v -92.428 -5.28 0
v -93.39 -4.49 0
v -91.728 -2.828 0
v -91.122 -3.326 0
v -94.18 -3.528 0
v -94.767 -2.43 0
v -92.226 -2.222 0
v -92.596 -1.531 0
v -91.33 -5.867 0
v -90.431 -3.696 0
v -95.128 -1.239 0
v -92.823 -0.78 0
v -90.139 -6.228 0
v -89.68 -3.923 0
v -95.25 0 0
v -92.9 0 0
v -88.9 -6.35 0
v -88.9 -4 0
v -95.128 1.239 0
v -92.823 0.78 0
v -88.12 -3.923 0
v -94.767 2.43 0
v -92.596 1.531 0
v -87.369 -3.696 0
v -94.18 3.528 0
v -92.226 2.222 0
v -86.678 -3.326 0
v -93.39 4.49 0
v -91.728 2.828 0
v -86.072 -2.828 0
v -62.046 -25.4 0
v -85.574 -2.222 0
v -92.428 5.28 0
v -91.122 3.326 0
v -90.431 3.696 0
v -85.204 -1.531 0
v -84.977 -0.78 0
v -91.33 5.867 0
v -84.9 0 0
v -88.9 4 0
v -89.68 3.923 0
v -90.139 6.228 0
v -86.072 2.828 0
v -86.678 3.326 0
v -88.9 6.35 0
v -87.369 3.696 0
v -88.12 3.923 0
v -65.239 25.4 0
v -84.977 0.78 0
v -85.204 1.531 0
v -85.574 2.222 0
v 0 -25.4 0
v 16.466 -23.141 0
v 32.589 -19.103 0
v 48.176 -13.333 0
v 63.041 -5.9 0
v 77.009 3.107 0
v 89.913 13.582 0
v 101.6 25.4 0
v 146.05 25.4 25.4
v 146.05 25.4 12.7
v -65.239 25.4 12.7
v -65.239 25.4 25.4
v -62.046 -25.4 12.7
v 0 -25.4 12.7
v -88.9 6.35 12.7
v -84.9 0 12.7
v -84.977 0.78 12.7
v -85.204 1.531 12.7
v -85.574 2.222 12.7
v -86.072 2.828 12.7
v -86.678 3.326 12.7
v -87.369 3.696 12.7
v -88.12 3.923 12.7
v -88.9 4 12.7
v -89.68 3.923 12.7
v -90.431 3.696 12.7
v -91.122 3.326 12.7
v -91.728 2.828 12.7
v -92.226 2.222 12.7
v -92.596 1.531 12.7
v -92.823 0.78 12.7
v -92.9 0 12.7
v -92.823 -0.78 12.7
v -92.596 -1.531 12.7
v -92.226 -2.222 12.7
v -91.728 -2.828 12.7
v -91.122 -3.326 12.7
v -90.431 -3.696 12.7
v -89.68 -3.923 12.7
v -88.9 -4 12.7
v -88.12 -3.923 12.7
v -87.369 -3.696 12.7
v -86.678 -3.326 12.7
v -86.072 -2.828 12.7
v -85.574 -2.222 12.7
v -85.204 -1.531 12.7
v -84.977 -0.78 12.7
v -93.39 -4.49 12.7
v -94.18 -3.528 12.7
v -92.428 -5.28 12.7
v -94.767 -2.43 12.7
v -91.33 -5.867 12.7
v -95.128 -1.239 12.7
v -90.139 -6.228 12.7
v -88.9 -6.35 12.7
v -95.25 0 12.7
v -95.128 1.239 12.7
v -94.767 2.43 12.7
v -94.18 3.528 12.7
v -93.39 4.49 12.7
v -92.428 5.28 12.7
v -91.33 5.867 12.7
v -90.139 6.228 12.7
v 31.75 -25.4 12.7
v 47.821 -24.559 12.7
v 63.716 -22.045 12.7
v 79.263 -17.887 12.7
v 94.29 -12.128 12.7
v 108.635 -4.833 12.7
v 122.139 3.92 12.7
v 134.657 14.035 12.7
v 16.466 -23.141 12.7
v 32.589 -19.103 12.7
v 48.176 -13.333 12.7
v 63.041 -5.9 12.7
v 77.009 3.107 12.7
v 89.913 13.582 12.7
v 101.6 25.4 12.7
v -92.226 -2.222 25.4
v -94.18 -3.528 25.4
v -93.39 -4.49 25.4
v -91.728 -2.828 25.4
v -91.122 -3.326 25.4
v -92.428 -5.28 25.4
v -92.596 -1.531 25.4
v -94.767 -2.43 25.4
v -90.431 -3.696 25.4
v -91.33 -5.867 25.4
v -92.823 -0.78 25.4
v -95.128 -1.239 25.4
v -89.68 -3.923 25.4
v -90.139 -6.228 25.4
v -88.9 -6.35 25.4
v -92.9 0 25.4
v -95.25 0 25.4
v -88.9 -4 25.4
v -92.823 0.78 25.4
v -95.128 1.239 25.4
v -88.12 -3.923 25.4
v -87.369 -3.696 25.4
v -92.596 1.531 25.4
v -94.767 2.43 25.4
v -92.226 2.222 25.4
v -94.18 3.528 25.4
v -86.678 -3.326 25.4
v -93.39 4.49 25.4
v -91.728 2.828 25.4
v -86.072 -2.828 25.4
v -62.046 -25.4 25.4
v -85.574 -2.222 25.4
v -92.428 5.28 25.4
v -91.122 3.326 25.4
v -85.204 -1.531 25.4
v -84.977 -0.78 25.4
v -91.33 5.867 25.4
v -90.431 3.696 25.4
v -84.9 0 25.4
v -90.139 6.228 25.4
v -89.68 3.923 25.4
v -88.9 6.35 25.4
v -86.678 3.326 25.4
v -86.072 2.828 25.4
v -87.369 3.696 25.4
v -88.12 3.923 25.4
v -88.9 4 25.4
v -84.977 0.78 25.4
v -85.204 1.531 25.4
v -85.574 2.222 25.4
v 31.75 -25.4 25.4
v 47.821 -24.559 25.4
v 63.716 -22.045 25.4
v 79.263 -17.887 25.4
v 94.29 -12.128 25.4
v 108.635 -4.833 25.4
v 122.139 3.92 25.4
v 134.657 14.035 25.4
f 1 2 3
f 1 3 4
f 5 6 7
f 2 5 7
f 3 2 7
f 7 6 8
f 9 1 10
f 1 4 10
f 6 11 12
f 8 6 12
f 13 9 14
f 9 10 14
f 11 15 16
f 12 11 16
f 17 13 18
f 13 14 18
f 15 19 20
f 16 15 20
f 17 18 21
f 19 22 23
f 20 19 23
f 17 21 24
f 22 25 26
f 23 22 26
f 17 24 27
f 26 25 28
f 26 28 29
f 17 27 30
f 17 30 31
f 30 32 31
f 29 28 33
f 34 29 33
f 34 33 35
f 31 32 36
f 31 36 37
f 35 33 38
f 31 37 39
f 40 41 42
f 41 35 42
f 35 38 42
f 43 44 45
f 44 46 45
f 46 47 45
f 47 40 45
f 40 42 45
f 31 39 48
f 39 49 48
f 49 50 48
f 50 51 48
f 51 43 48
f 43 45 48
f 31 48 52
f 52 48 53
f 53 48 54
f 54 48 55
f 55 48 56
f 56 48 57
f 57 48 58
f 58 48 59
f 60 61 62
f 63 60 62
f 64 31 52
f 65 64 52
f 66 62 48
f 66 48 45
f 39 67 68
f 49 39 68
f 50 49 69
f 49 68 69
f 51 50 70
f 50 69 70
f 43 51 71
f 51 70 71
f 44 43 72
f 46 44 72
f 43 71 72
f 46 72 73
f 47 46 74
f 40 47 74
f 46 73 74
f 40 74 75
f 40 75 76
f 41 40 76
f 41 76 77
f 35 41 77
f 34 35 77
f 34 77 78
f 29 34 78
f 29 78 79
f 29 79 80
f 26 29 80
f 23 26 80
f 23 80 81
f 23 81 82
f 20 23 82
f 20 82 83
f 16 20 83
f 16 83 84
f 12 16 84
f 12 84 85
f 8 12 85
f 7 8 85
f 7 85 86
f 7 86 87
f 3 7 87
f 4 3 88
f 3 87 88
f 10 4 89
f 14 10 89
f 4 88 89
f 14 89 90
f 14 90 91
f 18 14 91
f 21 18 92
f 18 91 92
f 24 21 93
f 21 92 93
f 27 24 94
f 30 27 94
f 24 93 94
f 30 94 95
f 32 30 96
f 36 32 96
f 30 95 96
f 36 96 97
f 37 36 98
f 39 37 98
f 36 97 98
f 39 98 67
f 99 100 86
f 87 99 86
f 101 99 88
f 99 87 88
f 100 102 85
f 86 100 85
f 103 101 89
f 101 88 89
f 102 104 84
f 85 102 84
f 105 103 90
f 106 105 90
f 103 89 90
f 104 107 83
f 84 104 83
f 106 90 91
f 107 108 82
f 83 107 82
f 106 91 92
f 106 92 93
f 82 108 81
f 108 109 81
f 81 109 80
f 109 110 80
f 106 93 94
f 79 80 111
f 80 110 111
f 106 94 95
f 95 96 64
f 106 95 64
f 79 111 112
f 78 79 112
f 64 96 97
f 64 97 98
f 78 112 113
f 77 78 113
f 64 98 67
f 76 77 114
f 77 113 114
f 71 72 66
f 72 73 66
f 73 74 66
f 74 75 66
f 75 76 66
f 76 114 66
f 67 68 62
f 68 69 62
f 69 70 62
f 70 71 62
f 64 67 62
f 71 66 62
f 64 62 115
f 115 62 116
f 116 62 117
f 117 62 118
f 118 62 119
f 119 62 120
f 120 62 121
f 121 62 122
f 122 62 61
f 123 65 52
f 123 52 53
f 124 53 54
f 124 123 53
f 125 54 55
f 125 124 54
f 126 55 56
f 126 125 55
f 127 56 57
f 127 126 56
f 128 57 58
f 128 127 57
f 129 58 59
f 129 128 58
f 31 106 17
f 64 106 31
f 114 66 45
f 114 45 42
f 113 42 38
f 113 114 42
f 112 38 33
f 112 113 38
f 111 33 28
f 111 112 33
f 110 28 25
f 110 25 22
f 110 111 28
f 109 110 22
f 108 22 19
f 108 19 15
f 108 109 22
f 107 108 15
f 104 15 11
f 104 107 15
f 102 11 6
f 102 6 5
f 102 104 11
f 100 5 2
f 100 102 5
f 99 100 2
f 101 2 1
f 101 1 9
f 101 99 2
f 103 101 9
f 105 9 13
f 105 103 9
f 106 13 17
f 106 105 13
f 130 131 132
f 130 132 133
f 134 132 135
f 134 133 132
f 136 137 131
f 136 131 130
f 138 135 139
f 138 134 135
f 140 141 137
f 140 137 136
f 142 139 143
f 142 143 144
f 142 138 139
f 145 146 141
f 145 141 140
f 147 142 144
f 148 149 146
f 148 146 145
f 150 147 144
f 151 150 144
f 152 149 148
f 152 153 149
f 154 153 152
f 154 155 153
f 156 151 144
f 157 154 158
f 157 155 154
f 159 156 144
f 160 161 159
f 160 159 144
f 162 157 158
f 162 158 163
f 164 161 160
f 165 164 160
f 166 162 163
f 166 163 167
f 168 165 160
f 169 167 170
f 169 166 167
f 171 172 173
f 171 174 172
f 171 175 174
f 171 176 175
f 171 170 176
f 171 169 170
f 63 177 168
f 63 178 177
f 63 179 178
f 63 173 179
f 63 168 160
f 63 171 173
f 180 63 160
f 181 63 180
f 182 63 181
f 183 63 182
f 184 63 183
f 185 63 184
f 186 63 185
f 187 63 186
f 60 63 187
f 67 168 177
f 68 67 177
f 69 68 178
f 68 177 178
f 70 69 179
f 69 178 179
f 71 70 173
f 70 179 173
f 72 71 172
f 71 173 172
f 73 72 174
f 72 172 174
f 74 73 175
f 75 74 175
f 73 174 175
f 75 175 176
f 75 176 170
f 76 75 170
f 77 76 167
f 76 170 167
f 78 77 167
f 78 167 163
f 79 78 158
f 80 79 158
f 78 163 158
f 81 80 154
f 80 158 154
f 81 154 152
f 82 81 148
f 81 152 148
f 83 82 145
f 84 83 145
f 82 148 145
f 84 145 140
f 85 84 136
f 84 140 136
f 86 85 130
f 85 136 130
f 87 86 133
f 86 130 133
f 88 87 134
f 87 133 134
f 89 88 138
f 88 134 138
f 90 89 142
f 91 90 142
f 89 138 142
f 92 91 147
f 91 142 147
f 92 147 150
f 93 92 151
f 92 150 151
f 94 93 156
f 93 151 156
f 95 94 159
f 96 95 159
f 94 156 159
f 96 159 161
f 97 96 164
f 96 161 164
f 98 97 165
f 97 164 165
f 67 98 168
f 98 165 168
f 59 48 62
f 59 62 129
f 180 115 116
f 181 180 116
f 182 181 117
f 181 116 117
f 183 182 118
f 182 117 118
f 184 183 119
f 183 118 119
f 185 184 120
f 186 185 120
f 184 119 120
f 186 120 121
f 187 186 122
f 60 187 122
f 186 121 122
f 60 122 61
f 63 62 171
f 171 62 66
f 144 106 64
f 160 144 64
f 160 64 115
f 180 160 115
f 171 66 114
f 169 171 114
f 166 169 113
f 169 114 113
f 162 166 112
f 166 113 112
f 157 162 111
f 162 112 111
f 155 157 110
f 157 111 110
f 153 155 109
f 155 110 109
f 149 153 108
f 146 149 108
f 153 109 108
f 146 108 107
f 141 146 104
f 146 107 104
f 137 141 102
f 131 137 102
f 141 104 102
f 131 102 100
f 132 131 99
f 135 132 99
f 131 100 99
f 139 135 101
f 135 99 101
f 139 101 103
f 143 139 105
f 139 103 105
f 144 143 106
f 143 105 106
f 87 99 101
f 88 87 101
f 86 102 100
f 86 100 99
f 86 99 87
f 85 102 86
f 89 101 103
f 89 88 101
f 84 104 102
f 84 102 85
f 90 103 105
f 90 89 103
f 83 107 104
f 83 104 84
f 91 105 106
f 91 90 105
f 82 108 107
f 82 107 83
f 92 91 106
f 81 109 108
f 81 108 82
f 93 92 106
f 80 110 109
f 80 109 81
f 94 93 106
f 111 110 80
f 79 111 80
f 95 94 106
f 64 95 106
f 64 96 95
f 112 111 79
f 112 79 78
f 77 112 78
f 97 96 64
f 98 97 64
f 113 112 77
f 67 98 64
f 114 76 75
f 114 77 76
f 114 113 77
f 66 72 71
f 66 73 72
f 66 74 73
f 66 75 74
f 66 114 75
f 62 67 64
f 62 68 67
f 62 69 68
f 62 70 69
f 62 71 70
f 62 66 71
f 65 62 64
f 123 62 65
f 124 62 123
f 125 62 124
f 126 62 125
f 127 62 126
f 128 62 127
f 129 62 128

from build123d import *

# Parameters (mm, degrees)
SKETCH1_W           = 203.2
SKETCH1_H           = 50.8
BOSS_EXTRUDE1_DEPTH = 12.7
SKETCH3_R           = 4
CUT_EXTRUDE1_DEPTH  = 106.494123059
CUT_EXTRUDE2_DEPTH  = 106.494123059
BOSS_EXTRUDE4_DEPTH = 12.7
CUT_EXTRUDE4_START  = 12.7
SKETCH11_5_R        = 4
CUT_EXTRUDE4_DEPTH  = 12.7


with BuildPart() as part:
    # Sketch1 → Boss-Extrude1 (new body)
    with BuildSketch(Plane.XY):
        Rectangle(SKETCH1_W, SKETCH1_H)
    extrude(amount=BOSS_EXTRUDE1_DEPTH)

    # Sketch3 → Cut-Extrude1 (cut, through all)
    with BuildSketch(Plane.XY.offset(12.7)):
        with Locations((-88.9, 0)):
            Circle(SKETCH3_R)
    extrude(amount=-CUT_EXTRUDE1_DEPTH, mode=Mode.SUBTRACT)

    # Sketch5 → Cut-Extrude2 (cut, through all)
    with BuildSketch(Plane.XY.offset(12.7)):
        with BuildLine():
            Line((-88.9, -6.35), (-62.046109456, -25.4))
            Line((-62.046109456, -25.4), (-101.6, -25.4))
            Line((-101.6, -25.4), (-101.6, 25.4))
            Line((-101.6, 25.4), (-65.239311186, 25.4))
            Line((-65.239311186, 25.4), (-88.9, 6.35))
            ThreePointArc((-88.9, 6.35), (-95.25, 0), (-88.9, -6.35))
        make_face()
        with BuildLine():
            Line((101.6, 25.4), (101.6, -25.4))
            Line((101.6, -25.4), (0, -25.4))
            ThreePointArc((0, -25.4), (55.709861996, -9.819723993), (101.6, 25.4))
        make_face()
    extrude(amount=-CUT_EXTRUDE2_DEPTH, mode=Mode.SUBTRACT)


with BuildPart() as body_2:
    # Sketch11 → Boss-Extrude4 (new body)
    with BuildSketch(Plane.XY.offset(12.7)):
        with BuildLine():
            Line((-65.239311186, 25.4), (-88.9, 6.35))
            ThreePointArc((-88.9, 6.35), (-95.25, 0), (-88.9, -6.35))
            Line((-88.9, -6.35), (-62.046109456, -25.4))
            Line((-62.046109456, -25.4), (0, -25.4))
            Line((0, -25.4), (31.75, -25.4))
            ThreePointArc((31.75, -25.4), (94.290247041, -12.128055843), (146.05, 25.4))
            Line((146.05, 25.4), (101.6, 25.4))
            Line((101.6, 25.4), (-65.239311186, 25.4))
        make_face()
    extrude(amount=BOSS_EXTRUDE4_DEPTH)

    # Sketch11<5> → Cut-Extrude4 (cut)
    with BuildSketch(Plane.XY.offset(12.7).offset(CUT_EXTRUDE4_START)):
        with Locations((-88.9, 0)):
            Circle(SKETCH11_5_R)
    extrude(amount=-CUT_EXTRUDE4_DEPTH, mode=Mode.SUBTRACT)


solid = Compound([part.part, body_2.part])
